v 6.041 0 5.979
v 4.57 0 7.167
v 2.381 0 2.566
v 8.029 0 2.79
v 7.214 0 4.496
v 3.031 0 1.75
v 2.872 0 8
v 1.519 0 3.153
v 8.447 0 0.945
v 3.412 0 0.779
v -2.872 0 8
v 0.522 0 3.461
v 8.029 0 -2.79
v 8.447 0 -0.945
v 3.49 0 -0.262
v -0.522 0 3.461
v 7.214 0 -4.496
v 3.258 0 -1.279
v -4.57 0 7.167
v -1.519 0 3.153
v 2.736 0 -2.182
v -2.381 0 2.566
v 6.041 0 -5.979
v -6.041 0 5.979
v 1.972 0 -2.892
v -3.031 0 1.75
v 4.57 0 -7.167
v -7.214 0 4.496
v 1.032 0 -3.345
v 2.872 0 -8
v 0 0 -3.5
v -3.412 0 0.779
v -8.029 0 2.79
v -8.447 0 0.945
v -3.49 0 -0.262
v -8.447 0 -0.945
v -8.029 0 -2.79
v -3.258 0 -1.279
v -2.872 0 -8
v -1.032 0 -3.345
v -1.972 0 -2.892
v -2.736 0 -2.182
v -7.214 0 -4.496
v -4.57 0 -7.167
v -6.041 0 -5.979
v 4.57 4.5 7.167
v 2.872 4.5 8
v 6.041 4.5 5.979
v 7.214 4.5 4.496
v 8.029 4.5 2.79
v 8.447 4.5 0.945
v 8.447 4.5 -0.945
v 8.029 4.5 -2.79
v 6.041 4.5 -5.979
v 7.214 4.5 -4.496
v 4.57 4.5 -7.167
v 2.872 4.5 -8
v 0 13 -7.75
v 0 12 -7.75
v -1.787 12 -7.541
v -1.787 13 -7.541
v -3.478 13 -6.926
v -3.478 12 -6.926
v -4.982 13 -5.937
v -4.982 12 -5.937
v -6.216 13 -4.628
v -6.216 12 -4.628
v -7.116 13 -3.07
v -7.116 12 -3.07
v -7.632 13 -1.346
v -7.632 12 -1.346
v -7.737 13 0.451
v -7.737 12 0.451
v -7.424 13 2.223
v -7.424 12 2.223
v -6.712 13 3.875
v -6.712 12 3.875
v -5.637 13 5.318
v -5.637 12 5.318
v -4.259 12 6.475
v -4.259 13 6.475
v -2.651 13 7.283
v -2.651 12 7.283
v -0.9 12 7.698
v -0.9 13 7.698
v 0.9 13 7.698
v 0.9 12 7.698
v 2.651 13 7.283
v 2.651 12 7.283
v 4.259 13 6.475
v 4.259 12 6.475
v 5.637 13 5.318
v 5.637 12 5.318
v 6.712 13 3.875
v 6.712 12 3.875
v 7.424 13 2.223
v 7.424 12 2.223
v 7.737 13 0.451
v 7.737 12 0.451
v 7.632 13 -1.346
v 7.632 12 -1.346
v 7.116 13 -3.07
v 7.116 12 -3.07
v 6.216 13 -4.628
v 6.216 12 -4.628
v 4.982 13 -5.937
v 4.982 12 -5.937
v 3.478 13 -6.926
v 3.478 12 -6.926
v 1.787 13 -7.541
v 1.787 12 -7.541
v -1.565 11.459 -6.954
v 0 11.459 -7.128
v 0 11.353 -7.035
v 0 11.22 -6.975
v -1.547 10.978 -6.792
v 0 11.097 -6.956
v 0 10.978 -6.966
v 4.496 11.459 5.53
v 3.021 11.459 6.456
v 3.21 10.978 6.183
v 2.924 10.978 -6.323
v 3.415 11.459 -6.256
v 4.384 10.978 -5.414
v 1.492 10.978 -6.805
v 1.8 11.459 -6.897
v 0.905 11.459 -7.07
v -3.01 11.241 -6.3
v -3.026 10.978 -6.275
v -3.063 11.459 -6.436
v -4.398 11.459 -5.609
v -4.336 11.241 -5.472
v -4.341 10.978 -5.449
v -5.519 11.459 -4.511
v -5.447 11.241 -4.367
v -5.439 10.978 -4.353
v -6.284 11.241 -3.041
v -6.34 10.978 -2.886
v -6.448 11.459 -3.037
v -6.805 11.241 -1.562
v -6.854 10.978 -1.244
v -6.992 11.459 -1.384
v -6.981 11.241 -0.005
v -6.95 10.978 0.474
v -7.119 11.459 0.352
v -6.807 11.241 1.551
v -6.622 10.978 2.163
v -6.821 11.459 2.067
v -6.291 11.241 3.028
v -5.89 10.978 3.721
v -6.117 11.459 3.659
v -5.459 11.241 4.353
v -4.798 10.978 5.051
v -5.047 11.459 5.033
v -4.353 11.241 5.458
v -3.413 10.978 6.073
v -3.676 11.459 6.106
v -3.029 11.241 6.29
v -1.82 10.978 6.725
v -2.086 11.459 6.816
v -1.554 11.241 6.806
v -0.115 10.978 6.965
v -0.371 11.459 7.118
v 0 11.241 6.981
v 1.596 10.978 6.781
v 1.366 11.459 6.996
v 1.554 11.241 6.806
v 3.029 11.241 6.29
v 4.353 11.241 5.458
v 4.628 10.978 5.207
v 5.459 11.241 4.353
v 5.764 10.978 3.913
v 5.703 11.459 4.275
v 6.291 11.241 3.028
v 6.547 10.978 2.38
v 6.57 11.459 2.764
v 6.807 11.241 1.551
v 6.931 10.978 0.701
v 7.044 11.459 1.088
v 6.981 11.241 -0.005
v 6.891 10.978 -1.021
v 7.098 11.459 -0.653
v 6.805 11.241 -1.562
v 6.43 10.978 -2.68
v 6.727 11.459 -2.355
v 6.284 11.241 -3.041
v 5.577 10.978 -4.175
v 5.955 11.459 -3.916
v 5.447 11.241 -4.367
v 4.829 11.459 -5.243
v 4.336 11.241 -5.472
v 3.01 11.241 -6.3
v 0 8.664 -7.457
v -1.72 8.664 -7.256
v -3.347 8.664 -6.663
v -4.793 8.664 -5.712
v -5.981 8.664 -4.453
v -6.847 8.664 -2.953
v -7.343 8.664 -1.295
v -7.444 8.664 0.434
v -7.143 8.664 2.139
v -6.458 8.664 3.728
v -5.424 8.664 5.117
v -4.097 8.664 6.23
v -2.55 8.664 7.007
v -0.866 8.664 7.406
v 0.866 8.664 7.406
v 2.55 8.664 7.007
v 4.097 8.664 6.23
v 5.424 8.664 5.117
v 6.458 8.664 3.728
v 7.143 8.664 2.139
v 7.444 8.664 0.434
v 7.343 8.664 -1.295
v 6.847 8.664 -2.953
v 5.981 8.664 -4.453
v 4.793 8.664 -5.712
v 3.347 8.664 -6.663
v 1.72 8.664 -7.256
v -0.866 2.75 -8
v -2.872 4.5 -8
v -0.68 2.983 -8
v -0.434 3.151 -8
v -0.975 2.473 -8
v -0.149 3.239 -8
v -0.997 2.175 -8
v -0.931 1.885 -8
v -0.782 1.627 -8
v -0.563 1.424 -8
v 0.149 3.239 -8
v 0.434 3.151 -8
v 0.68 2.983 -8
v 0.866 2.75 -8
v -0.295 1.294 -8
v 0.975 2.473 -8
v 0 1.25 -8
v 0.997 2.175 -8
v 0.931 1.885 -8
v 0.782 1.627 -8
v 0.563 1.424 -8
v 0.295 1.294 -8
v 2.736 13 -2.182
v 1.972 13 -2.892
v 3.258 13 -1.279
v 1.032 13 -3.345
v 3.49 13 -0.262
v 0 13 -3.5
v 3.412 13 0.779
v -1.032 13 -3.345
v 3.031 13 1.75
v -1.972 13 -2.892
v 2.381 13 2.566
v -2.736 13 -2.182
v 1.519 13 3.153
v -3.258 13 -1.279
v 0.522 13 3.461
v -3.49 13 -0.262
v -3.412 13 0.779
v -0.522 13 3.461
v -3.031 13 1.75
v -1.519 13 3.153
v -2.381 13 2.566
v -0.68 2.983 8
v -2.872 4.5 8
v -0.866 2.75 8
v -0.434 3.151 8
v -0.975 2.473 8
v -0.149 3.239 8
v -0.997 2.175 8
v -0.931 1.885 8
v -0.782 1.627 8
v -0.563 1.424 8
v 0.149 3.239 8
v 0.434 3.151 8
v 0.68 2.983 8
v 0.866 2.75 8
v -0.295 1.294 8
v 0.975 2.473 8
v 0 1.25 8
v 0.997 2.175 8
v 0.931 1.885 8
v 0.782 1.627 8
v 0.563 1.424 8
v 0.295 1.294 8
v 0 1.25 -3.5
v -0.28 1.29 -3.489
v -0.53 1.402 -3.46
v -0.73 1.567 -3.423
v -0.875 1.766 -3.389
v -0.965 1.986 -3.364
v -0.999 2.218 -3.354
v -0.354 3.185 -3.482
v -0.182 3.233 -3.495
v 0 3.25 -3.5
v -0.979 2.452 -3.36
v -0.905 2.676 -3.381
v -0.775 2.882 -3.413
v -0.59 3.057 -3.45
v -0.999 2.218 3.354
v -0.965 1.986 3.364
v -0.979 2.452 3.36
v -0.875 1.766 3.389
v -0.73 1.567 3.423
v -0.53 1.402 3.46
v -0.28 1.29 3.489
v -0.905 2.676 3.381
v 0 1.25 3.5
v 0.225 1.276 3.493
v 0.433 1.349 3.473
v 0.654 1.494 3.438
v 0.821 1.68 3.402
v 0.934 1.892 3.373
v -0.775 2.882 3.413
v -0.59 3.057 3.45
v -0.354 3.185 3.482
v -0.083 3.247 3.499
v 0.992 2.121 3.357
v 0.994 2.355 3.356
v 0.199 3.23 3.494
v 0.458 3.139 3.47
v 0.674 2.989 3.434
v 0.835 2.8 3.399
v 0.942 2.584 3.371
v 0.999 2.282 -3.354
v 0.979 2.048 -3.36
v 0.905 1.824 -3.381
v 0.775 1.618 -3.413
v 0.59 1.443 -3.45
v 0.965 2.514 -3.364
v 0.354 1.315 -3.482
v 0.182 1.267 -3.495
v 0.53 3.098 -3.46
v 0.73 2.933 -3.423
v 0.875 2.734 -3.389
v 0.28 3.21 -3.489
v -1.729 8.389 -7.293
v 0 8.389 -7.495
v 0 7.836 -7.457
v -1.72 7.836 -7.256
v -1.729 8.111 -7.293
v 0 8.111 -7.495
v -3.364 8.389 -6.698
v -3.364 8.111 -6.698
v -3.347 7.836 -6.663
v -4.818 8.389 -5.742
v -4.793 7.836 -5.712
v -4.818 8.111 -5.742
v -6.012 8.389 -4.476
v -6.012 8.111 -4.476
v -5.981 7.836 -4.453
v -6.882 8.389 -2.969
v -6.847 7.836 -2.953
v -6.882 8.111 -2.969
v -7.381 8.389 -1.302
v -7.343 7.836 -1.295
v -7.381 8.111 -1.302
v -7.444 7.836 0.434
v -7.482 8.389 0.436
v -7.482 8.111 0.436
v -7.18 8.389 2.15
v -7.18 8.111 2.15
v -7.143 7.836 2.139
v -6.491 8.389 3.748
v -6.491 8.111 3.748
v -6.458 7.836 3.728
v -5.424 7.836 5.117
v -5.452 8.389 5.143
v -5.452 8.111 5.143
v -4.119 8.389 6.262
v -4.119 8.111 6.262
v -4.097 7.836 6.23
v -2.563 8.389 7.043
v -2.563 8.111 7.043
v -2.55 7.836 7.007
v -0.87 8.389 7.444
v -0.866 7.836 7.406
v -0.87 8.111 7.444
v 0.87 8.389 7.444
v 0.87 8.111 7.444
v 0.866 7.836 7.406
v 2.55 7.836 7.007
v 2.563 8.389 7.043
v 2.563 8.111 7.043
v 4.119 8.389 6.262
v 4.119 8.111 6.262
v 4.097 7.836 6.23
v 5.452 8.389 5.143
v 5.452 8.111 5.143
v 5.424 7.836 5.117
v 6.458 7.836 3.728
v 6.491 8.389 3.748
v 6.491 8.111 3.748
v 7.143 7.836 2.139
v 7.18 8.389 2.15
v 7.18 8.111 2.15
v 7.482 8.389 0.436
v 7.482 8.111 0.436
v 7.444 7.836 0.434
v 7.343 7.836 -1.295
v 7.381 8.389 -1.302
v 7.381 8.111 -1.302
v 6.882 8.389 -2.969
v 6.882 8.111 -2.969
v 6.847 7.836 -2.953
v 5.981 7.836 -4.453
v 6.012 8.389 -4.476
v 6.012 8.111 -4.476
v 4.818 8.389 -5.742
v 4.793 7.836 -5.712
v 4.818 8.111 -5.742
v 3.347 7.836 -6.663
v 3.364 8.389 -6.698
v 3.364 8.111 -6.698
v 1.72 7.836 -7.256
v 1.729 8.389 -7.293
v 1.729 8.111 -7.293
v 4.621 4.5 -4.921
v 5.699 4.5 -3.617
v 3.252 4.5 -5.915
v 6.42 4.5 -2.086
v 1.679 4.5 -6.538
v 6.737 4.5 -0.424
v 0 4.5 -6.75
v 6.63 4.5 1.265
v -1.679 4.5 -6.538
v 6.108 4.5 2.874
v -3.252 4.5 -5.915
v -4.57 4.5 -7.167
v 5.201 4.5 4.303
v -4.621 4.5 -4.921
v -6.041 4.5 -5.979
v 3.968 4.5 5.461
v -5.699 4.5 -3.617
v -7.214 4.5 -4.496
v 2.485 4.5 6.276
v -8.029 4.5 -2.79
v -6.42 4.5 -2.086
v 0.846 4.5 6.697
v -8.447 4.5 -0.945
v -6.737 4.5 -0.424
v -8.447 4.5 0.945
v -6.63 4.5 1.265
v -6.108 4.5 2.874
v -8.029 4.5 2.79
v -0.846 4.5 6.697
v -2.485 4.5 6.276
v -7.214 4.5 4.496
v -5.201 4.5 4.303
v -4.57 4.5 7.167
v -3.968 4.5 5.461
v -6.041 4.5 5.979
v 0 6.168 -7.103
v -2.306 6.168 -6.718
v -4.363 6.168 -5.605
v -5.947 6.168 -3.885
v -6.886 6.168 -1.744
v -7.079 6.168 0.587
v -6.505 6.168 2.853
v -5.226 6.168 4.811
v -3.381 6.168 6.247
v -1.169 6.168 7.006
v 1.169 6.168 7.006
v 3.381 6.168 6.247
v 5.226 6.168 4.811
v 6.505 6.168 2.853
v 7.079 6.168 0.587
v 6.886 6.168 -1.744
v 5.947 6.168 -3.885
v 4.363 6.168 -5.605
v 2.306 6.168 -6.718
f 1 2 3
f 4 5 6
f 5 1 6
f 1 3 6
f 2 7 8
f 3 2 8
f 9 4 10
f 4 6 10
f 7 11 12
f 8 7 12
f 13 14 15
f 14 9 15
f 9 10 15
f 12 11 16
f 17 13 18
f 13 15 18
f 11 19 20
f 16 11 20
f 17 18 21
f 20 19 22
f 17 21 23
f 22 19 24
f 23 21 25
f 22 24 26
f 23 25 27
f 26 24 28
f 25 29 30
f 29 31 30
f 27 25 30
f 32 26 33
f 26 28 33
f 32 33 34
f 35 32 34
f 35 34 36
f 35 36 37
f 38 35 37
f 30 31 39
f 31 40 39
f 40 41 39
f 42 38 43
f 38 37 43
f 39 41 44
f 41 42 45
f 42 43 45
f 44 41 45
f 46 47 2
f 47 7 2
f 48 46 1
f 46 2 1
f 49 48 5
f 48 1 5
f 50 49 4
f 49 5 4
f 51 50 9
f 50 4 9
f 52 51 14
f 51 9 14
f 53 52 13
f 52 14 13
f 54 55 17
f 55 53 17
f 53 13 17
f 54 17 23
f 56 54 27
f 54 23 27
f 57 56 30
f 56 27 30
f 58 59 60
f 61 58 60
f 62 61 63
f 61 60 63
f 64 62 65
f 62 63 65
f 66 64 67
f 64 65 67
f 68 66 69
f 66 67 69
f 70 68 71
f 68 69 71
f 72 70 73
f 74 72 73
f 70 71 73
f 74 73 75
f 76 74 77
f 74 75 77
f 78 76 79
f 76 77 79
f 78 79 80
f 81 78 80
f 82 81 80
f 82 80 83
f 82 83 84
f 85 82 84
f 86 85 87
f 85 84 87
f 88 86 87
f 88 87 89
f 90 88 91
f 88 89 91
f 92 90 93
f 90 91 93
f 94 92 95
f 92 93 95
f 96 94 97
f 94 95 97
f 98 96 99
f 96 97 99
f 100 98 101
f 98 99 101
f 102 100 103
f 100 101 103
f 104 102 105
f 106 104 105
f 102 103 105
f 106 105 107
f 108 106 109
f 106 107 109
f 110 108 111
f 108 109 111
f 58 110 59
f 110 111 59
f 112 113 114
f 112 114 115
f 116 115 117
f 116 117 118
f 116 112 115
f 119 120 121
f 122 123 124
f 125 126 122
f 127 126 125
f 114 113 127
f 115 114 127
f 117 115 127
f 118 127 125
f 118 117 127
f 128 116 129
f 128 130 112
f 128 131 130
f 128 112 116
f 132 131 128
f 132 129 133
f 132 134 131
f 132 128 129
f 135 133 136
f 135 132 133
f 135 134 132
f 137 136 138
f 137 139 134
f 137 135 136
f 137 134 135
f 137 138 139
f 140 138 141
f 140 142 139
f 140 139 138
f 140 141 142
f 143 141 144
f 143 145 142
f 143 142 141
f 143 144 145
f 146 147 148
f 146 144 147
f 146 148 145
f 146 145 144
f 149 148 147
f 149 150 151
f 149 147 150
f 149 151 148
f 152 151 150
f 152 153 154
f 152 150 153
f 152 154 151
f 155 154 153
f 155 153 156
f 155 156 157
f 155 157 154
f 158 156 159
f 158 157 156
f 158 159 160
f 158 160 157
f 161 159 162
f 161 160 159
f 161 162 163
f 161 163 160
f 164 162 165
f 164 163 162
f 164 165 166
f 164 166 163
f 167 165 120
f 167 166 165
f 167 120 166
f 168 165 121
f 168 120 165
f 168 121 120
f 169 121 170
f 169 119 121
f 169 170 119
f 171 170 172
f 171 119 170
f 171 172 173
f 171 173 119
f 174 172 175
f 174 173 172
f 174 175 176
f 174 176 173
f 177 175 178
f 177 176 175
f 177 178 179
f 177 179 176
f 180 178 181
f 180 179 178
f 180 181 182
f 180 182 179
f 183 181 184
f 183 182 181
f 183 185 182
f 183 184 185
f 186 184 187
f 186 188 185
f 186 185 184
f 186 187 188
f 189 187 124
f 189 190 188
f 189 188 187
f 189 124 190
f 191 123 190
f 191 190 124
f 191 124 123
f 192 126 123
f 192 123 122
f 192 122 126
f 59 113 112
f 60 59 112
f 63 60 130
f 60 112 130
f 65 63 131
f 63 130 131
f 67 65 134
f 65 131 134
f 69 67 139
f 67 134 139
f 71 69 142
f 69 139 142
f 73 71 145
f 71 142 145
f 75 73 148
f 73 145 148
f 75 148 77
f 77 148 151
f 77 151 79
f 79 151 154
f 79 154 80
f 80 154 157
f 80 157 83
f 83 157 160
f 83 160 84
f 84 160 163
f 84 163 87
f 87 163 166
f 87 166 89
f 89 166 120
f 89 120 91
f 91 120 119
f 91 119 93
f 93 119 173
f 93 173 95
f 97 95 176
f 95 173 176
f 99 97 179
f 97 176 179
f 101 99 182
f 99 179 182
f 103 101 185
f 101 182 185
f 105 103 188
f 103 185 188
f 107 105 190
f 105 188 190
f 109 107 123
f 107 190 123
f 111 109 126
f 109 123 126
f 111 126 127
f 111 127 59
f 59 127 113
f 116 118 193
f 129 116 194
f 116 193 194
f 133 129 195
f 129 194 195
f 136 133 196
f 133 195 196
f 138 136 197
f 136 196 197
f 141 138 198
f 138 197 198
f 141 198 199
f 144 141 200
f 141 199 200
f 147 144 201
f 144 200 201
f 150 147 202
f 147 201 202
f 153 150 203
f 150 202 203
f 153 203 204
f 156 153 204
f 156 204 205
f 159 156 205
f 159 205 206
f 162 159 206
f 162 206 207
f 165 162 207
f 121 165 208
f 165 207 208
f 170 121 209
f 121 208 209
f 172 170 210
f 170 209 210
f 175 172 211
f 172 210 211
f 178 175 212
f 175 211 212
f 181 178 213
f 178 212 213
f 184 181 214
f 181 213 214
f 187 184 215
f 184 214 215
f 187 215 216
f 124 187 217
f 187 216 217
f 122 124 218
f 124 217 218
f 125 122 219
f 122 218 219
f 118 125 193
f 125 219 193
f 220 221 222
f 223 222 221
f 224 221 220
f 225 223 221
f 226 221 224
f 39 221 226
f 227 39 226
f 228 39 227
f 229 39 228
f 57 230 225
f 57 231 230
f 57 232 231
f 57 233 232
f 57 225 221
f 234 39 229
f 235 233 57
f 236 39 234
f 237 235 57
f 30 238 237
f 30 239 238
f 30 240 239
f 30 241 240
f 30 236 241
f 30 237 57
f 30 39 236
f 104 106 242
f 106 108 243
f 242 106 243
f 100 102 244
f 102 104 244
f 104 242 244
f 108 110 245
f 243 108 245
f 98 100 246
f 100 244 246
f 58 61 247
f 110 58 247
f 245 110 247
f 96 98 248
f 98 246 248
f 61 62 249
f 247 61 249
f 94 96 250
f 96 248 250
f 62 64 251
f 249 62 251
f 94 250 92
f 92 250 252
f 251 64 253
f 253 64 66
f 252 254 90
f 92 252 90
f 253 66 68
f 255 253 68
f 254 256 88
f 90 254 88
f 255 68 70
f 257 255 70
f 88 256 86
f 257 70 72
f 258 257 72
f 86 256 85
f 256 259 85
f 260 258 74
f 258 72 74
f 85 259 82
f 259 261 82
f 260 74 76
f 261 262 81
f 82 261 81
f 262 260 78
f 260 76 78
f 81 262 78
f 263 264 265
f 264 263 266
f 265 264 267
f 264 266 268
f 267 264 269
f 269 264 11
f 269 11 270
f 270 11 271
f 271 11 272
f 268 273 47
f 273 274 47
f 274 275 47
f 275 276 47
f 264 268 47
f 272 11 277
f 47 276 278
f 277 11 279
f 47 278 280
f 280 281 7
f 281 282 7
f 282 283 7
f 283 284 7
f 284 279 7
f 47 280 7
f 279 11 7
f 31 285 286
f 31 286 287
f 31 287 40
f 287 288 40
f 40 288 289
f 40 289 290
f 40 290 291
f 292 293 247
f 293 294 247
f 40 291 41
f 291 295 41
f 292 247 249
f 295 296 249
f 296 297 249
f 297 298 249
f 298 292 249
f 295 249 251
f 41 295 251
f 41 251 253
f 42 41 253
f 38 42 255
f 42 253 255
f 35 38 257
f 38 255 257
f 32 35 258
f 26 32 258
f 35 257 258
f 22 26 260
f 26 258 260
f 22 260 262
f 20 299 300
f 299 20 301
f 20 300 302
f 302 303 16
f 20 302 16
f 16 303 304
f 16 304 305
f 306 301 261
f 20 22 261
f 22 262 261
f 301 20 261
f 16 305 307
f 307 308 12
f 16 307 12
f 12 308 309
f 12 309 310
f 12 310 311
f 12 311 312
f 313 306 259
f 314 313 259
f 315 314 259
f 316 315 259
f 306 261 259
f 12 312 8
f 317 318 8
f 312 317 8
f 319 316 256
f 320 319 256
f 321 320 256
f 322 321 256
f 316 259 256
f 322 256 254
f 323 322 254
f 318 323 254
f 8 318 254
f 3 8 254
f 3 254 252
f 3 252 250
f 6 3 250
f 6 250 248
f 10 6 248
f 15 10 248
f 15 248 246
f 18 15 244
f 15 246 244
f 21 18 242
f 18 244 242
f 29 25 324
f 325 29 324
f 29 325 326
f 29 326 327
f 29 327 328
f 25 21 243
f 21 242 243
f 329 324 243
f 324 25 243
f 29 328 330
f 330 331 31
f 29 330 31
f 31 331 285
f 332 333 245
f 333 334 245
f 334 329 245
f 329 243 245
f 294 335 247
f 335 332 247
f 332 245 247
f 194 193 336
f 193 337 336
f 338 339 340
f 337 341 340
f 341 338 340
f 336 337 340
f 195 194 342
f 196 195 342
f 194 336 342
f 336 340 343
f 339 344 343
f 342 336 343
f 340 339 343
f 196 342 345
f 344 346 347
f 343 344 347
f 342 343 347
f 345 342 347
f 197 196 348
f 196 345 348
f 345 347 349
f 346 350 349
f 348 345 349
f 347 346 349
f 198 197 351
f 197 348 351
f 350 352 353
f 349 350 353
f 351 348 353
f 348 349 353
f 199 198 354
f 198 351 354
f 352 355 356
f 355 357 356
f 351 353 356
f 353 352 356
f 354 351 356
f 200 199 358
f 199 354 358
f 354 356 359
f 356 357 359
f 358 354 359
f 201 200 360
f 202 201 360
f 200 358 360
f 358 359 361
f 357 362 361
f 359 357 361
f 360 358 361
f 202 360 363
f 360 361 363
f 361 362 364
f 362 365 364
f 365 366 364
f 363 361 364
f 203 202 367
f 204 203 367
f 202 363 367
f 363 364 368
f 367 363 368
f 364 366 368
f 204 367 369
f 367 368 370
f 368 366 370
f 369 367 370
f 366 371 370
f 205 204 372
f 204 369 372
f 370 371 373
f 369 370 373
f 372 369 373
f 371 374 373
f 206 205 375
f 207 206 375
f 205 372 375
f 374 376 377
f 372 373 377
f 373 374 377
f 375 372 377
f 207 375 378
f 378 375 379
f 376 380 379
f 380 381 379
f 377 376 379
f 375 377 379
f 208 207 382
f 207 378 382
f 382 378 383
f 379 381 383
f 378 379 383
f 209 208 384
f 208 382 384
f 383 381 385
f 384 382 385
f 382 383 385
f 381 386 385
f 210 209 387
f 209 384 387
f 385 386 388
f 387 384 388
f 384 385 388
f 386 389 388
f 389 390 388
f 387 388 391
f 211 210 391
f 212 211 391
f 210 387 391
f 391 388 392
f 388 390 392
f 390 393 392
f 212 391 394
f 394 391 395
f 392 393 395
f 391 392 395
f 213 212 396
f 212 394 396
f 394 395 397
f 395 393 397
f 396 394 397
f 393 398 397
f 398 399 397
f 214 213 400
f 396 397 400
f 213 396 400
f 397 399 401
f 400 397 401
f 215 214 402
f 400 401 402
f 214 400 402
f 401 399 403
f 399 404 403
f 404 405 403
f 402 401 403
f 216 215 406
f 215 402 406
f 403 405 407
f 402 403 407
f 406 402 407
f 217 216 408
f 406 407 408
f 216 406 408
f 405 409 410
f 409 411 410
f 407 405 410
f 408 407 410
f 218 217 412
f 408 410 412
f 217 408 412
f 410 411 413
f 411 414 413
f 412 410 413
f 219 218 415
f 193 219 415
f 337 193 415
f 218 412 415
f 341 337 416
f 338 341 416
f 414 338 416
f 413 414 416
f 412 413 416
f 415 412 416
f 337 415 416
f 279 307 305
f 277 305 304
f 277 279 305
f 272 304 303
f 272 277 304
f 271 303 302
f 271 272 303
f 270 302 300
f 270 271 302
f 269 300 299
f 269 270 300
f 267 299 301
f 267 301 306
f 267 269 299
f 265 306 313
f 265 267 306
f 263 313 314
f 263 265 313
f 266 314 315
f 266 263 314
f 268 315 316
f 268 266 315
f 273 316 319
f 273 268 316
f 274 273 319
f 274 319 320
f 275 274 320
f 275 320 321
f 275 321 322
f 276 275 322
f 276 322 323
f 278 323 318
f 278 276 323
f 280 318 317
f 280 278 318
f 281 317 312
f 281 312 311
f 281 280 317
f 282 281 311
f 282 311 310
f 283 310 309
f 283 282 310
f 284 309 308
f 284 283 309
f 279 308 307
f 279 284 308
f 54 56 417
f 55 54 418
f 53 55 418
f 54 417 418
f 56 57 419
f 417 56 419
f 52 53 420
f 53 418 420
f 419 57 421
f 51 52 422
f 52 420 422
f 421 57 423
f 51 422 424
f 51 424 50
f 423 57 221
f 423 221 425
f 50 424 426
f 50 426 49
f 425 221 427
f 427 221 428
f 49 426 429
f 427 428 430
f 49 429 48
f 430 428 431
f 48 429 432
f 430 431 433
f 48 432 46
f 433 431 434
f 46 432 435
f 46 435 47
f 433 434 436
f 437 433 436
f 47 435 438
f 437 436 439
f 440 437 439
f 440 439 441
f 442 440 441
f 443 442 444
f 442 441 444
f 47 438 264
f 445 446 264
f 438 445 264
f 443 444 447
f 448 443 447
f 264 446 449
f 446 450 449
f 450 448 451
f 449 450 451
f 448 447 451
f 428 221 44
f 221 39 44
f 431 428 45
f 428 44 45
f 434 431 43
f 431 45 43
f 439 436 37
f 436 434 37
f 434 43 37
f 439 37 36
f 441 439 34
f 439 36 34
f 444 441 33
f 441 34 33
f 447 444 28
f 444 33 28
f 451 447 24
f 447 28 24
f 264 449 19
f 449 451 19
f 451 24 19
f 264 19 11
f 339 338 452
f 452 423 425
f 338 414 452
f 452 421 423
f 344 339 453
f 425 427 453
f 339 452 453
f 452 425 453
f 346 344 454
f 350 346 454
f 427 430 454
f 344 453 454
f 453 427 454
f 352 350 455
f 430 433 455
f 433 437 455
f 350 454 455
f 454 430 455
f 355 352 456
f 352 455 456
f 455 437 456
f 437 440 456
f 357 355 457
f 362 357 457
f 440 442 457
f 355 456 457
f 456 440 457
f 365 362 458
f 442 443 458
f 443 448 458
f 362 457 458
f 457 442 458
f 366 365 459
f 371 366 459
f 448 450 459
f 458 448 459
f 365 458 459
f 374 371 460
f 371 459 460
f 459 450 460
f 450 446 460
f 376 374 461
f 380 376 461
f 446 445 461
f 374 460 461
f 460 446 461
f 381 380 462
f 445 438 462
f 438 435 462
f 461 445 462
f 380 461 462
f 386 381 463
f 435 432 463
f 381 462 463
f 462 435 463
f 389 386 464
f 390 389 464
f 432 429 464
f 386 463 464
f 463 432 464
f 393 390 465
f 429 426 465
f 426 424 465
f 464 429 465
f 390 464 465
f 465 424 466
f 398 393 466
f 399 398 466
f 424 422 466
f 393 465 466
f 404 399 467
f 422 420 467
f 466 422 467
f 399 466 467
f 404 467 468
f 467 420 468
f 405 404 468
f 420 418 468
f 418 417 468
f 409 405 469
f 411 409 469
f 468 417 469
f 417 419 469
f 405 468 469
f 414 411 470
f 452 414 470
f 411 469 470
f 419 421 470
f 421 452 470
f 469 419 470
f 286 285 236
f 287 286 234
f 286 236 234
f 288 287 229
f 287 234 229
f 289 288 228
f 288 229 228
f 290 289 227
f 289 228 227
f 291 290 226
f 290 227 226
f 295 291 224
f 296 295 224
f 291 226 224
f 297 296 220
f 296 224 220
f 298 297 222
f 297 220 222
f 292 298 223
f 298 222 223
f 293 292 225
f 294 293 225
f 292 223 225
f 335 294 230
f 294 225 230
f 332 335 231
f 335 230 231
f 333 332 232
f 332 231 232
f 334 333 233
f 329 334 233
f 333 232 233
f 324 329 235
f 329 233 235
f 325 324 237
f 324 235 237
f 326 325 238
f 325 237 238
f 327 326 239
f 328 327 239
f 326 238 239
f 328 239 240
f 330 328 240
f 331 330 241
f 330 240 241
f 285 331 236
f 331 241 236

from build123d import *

# Parameters (mm, degrees)
CUT_EXTRUDE1_DEPTH = 4.5
CHAMFER1_SIZE      = 1
CHAMFER1_SIZE_2    = 0.75
FILLET2_R          = 0.5


with BuildPart() as part:
    # Sketch2 → Revolve1 (revolve)
    with BuildSketch(Plane.XY, mode=Mode.PRIVATE) as revolve1_sk:
        with BuildLine():
            Line((3.5, 0), (3.5, 13))
            Line((3.5, 13), (7.75, 13))
            Line((7.75, 13), (7.75, 12))
            Line((7.75, 12), (6.75, 12))
            Line((6.75, 12), (7.456581804, 8.664472732))
            ThreePointArc((7.456581804, 8.664472732), (7.5, 8.25), (7.456581804, 7.835527268))
            Line((7.456581804, 7.835527268), (6.75, 4.5))
            Line((6.75, 4.5), (8.5, 4.5))
            Line((8.5, 4.5), (8.5, 0))
            Line((8.5, 0), (3.5, 0))
        make_face()
    revolve(revolve1_sk.sketch.rotate(Axis((0, 0, 0), (0, 1, 0)), 90), axis=Axis((0, 0, 0), (0, 1, 0)))

    # Sketch3 → Cut-Extrude1 (cut)
    with BuildSketch(Plane.XZ):
        with BuildLine():
            Line((-2.872281323, 8), (2.872281323, 8))
            ThreePointArc((2.872281323, 8), (0, 8.5), (-2.872281323, 8))
        make_face()
    cut_extrude1 = extrude(amount=-CUT_EXTRUDE1_DEPTH, mode=Mode.SUBTRACT)

    # Sketch5 → Ø2.0mm Dowel Hole1 (revolve, cut)
    with BuildSketch(Plane(origin=(0, 2.25, 8), x_dir=(0, -1, 0), z_dir=(1, 0, 0))):
        Polygon((0, 0), (0, 6.600860619), (1, 6), (1, 0), align=None)
    f_2_0mm_dowel_hole1 = revolve(axis=Axis((0, 2.25, 14.35), (0, 0, -1)), mode=Mode.SUBTRACT)

    # Mirror1: Cut-Extrude1, Ø2.0mm Dowel Hole1 across plane
    add(cut_extrude1.mirror(Plane.XY), mode=Mode.SUBTRACT)
    add(f_2_0mm_dowel_hole1.mirror(Plane.XY), mode=Mode.SUBTRACT)

    # Chamfer1
    # the kernel refuses this chamfer: 1, 0.75 mm, written as the material it adds along each edge
    with BuildSketch(Plane(origin=(0, 12, 0), x_dir=(0, 0, -1), z_dir=(1, 0, 0))) as chamfer1_piece_1:
        Polygon((6.75 + CHAMFER1_SIZE, 0), (6.75 + CHAMFER1_SIZE_2 * 0.20723636606, -CHAMFER1_SIZE_2 * 0.978290901819), (6.75, 0), align=None)
    revolve(axis=Axis((0, 12, 0), (0, 1, 0)))

    # Fillet2
    fillet2_edges = [part.edges().sort_by_distance(p)[0] for p in [
        (0, 11.266281824, 6.905427275),
    ]]
    fillet(fillet2_edges, radius=FILLET2_R)


solid = part.part
